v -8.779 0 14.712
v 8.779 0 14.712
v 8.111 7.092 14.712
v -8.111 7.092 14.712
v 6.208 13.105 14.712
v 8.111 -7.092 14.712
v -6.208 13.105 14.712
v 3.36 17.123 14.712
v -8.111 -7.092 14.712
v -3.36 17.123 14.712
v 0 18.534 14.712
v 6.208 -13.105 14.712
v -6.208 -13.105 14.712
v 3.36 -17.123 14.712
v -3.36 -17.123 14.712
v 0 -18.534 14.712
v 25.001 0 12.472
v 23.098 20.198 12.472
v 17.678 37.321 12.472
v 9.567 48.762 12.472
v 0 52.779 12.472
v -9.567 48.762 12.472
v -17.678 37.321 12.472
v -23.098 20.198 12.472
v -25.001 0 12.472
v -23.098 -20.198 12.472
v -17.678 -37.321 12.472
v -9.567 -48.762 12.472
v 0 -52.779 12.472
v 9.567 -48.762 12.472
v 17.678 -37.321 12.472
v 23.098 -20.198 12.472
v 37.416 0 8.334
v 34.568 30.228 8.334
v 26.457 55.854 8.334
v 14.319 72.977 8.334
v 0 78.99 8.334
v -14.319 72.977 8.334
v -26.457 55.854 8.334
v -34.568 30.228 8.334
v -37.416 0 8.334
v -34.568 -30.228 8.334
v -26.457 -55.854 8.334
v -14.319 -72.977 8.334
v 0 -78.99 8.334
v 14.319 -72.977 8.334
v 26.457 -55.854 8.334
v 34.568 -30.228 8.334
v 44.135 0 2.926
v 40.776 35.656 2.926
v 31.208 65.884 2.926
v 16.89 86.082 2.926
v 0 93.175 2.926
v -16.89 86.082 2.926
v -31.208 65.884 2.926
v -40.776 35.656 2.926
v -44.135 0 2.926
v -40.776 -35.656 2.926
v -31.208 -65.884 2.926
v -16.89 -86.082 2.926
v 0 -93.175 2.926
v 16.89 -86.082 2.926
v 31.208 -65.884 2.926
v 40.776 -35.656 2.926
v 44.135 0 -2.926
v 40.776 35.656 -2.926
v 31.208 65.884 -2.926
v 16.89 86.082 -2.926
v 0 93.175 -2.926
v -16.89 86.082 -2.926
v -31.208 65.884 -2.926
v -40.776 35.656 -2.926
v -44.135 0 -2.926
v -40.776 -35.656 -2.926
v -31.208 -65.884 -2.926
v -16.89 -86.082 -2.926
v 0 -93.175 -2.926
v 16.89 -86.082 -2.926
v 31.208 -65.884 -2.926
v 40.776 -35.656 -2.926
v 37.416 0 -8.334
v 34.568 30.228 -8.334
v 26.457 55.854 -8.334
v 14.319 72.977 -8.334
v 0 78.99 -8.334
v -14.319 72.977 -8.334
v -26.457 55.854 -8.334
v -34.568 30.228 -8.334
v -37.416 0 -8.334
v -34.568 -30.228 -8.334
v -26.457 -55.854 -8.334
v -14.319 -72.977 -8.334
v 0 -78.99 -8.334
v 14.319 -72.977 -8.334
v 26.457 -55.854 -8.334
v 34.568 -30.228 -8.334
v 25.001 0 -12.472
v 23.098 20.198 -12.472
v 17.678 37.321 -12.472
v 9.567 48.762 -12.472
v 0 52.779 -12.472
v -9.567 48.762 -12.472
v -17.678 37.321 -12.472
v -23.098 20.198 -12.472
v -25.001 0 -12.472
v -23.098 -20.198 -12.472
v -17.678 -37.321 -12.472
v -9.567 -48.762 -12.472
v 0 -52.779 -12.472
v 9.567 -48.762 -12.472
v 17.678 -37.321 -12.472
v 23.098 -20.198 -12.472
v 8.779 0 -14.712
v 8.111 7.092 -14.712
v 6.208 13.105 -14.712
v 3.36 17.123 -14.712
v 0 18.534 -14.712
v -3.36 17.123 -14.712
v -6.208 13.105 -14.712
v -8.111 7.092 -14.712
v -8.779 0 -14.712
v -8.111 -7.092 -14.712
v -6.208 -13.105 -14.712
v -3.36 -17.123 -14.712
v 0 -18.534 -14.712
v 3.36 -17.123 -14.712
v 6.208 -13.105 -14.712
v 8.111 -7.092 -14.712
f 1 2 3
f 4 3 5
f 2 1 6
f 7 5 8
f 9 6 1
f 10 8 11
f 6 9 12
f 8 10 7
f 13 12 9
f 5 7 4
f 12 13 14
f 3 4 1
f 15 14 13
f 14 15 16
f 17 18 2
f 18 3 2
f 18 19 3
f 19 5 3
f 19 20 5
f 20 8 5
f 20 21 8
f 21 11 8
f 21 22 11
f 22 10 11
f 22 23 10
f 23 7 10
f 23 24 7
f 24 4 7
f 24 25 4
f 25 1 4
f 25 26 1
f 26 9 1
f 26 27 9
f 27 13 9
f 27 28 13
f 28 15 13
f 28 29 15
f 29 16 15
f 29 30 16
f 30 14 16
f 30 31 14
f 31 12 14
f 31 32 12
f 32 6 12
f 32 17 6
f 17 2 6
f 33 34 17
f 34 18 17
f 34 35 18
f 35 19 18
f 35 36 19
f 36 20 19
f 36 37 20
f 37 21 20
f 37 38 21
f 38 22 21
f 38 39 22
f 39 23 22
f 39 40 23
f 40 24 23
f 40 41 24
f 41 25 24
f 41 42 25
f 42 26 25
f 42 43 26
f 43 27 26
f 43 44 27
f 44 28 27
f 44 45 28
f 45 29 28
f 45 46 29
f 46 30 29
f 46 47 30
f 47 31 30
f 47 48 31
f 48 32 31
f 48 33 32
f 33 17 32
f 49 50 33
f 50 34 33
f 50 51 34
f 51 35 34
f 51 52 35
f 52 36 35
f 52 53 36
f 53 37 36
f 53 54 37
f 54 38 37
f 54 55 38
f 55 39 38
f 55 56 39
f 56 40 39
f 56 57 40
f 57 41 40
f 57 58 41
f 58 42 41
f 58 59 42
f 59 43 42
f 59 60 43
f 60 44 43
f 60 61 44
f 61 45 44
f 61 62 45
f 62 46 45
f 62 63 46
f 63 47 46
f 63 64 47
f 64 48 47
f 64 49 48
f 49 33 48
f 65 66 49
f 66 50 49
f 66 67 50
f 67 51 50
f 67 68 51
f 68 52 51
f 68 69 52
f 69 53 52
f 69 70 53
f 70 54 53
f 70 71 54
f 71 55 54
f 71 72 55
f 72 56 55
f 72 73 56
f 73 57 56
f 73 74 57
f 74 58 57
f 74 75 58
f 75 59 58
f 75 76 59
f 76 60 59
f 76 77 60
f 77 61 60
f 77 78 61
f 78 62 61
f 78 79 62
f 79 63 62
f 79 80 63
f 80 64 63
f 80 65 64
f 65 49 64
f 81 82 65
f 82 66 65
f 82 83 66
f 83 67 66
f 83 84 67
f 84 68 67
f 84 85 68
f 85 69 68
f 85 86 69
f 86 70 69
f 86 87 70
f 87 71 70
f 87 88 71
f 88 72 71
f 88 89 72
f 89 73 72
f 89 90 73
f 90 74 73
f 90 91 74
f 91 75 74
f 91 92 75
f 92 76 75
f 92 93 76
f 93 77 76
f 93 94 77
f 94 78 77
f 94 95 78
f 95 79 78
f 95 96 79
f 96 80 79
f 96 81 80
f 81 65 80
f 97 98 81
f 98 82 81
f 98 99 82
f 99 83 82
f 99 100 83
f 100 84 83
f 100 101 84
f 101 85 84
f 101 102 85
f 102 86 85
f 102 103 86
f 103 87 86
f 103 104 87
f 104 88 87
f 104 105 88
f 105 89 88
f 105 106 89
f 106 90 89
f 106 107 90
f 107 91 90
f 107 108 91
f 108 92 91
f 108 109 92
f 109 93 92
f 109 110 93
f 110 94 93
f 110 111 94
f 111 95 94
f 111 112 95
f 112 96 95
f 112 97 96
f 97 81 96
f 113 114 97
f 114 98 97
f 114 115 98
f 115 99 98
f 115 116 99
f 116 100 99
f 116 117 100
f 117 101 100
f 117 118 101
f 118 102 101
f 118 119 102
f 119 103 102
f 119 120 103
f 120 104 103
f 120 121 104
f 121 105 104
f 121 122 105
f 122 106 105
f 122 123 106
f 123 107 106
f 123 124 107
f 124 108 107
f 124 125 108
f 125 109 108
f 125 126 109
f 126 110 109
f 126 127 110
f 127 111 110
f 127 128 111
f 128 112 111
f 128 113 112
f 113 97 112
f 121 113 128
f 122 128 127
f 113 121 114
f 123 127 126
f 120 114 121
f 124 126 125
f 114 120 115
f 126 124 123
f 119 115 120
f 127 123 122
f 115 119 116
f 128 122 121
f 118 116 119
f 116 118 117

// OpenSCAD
// Generated by SolidPython 1.0.1 on 2020-07-29 00:46:49


scale(v = [9, 19, 3]) {
	sphere(r = 5);
}
/***********************************************
*********      SolidPython code:      **********
************************************************
 
# import packages: SolidPython
from solid import *
from solid.utils import *
from itertools import chain, combinations, permutations


class Resize:

    def __init__(self, scad_file):
        self.scad_file = scad_file
        #self.scad_file = import_scad(scad_file)
        # cone/cylinder param:
        self.r1 = 0
        self.r2 = 0
        self.h = 0
        # rectangular prism param:
        self.w = 0
        self.l = 0
        # ellipse param:
        self.r = 0

    # import OpenScad code (file name corresponds to shape)


    # classify shape + parameters
    def assign(self, param1, param2, param3):
        if self.scad_file == 'cone.scad':
            self.r1 = param1
            self.r2 = param2
            self.h = param3
        elif self.scad_file == 'cylinder.scad':
            self.r1 = param1
            self.r2 = param2
            self.h = param3
        elif self.scad_file == 'rectangularPrism.scad':
            self.h = param1
            self.l = param2
            self.w = param3
        else:
            self.r = param1
            self.h = param2

    # resize parameters
    def iterate(self):
        x = range(3, 20, 2)
        i = 1
        if self.scad_file == 'cone.scad':
            tempList = list(permutations(x, 2))
            for temp in tempList:
                param1 = temp[0]
                param2 = temp[1]
                filepath = 'produced_scad_files/' + 'cone' + str(param1) + '_' + str(param2) + '_' + '.scad'
                scad_render_to_file(cylinder(h=param1, r1=param2, r2=0), filepath)

        elif self.scad_file == 'cylinder.scad':
            tempList = list(permutations(x, 3))
            for temp in tempList:
                param1 = temp[0]
                param2 = temp[1]
                filepath = 'produced_scad_files/' + 'cylinder' + str(param1) + '_' + str(param2) + '_' + '.scad'
                scad_render_to_file(cylinder(h=param1, r1=param2, r2=param2), filepath)

        elif self.scad_file == 'rectangularPrism.scad':
            tempList = list(permutations(x, 3))
            for temp in tempList:
                param1 = temp[0]
                param2 = temp[1]
                param3 = temp[2]
                filepath = 'produced_scad_files/' + 'rectangularPrism' + str(param1) + '_' + str(param2) + '_' + str(
                    param3) + '.scad'
                scad_render_to_file(cube(size=(param1, param2, param3)), filepath)

        elif self.scad_file == 'ellipse.scad':
            tempList = list(permutations(x, 4))
            for temp in tempList:
                param1 = temp[0]
                param2 = temp[1]
                param3 = temp[2]
                param4 = temp[3]
                filepath = 'produced_scad_files/' + 'ellipse' + str(param1) + '_' + str(param2) + '_' + str(param3) + '_' + str(param4) + '.scad'
                scad_render_to_file(scale([param1, param2, param3])(sphere(r=param4)), filepath)

    def render_to_scadfile(self):
        scad_render_to_file(scad, 'example.scad') 
 
************************************************/
